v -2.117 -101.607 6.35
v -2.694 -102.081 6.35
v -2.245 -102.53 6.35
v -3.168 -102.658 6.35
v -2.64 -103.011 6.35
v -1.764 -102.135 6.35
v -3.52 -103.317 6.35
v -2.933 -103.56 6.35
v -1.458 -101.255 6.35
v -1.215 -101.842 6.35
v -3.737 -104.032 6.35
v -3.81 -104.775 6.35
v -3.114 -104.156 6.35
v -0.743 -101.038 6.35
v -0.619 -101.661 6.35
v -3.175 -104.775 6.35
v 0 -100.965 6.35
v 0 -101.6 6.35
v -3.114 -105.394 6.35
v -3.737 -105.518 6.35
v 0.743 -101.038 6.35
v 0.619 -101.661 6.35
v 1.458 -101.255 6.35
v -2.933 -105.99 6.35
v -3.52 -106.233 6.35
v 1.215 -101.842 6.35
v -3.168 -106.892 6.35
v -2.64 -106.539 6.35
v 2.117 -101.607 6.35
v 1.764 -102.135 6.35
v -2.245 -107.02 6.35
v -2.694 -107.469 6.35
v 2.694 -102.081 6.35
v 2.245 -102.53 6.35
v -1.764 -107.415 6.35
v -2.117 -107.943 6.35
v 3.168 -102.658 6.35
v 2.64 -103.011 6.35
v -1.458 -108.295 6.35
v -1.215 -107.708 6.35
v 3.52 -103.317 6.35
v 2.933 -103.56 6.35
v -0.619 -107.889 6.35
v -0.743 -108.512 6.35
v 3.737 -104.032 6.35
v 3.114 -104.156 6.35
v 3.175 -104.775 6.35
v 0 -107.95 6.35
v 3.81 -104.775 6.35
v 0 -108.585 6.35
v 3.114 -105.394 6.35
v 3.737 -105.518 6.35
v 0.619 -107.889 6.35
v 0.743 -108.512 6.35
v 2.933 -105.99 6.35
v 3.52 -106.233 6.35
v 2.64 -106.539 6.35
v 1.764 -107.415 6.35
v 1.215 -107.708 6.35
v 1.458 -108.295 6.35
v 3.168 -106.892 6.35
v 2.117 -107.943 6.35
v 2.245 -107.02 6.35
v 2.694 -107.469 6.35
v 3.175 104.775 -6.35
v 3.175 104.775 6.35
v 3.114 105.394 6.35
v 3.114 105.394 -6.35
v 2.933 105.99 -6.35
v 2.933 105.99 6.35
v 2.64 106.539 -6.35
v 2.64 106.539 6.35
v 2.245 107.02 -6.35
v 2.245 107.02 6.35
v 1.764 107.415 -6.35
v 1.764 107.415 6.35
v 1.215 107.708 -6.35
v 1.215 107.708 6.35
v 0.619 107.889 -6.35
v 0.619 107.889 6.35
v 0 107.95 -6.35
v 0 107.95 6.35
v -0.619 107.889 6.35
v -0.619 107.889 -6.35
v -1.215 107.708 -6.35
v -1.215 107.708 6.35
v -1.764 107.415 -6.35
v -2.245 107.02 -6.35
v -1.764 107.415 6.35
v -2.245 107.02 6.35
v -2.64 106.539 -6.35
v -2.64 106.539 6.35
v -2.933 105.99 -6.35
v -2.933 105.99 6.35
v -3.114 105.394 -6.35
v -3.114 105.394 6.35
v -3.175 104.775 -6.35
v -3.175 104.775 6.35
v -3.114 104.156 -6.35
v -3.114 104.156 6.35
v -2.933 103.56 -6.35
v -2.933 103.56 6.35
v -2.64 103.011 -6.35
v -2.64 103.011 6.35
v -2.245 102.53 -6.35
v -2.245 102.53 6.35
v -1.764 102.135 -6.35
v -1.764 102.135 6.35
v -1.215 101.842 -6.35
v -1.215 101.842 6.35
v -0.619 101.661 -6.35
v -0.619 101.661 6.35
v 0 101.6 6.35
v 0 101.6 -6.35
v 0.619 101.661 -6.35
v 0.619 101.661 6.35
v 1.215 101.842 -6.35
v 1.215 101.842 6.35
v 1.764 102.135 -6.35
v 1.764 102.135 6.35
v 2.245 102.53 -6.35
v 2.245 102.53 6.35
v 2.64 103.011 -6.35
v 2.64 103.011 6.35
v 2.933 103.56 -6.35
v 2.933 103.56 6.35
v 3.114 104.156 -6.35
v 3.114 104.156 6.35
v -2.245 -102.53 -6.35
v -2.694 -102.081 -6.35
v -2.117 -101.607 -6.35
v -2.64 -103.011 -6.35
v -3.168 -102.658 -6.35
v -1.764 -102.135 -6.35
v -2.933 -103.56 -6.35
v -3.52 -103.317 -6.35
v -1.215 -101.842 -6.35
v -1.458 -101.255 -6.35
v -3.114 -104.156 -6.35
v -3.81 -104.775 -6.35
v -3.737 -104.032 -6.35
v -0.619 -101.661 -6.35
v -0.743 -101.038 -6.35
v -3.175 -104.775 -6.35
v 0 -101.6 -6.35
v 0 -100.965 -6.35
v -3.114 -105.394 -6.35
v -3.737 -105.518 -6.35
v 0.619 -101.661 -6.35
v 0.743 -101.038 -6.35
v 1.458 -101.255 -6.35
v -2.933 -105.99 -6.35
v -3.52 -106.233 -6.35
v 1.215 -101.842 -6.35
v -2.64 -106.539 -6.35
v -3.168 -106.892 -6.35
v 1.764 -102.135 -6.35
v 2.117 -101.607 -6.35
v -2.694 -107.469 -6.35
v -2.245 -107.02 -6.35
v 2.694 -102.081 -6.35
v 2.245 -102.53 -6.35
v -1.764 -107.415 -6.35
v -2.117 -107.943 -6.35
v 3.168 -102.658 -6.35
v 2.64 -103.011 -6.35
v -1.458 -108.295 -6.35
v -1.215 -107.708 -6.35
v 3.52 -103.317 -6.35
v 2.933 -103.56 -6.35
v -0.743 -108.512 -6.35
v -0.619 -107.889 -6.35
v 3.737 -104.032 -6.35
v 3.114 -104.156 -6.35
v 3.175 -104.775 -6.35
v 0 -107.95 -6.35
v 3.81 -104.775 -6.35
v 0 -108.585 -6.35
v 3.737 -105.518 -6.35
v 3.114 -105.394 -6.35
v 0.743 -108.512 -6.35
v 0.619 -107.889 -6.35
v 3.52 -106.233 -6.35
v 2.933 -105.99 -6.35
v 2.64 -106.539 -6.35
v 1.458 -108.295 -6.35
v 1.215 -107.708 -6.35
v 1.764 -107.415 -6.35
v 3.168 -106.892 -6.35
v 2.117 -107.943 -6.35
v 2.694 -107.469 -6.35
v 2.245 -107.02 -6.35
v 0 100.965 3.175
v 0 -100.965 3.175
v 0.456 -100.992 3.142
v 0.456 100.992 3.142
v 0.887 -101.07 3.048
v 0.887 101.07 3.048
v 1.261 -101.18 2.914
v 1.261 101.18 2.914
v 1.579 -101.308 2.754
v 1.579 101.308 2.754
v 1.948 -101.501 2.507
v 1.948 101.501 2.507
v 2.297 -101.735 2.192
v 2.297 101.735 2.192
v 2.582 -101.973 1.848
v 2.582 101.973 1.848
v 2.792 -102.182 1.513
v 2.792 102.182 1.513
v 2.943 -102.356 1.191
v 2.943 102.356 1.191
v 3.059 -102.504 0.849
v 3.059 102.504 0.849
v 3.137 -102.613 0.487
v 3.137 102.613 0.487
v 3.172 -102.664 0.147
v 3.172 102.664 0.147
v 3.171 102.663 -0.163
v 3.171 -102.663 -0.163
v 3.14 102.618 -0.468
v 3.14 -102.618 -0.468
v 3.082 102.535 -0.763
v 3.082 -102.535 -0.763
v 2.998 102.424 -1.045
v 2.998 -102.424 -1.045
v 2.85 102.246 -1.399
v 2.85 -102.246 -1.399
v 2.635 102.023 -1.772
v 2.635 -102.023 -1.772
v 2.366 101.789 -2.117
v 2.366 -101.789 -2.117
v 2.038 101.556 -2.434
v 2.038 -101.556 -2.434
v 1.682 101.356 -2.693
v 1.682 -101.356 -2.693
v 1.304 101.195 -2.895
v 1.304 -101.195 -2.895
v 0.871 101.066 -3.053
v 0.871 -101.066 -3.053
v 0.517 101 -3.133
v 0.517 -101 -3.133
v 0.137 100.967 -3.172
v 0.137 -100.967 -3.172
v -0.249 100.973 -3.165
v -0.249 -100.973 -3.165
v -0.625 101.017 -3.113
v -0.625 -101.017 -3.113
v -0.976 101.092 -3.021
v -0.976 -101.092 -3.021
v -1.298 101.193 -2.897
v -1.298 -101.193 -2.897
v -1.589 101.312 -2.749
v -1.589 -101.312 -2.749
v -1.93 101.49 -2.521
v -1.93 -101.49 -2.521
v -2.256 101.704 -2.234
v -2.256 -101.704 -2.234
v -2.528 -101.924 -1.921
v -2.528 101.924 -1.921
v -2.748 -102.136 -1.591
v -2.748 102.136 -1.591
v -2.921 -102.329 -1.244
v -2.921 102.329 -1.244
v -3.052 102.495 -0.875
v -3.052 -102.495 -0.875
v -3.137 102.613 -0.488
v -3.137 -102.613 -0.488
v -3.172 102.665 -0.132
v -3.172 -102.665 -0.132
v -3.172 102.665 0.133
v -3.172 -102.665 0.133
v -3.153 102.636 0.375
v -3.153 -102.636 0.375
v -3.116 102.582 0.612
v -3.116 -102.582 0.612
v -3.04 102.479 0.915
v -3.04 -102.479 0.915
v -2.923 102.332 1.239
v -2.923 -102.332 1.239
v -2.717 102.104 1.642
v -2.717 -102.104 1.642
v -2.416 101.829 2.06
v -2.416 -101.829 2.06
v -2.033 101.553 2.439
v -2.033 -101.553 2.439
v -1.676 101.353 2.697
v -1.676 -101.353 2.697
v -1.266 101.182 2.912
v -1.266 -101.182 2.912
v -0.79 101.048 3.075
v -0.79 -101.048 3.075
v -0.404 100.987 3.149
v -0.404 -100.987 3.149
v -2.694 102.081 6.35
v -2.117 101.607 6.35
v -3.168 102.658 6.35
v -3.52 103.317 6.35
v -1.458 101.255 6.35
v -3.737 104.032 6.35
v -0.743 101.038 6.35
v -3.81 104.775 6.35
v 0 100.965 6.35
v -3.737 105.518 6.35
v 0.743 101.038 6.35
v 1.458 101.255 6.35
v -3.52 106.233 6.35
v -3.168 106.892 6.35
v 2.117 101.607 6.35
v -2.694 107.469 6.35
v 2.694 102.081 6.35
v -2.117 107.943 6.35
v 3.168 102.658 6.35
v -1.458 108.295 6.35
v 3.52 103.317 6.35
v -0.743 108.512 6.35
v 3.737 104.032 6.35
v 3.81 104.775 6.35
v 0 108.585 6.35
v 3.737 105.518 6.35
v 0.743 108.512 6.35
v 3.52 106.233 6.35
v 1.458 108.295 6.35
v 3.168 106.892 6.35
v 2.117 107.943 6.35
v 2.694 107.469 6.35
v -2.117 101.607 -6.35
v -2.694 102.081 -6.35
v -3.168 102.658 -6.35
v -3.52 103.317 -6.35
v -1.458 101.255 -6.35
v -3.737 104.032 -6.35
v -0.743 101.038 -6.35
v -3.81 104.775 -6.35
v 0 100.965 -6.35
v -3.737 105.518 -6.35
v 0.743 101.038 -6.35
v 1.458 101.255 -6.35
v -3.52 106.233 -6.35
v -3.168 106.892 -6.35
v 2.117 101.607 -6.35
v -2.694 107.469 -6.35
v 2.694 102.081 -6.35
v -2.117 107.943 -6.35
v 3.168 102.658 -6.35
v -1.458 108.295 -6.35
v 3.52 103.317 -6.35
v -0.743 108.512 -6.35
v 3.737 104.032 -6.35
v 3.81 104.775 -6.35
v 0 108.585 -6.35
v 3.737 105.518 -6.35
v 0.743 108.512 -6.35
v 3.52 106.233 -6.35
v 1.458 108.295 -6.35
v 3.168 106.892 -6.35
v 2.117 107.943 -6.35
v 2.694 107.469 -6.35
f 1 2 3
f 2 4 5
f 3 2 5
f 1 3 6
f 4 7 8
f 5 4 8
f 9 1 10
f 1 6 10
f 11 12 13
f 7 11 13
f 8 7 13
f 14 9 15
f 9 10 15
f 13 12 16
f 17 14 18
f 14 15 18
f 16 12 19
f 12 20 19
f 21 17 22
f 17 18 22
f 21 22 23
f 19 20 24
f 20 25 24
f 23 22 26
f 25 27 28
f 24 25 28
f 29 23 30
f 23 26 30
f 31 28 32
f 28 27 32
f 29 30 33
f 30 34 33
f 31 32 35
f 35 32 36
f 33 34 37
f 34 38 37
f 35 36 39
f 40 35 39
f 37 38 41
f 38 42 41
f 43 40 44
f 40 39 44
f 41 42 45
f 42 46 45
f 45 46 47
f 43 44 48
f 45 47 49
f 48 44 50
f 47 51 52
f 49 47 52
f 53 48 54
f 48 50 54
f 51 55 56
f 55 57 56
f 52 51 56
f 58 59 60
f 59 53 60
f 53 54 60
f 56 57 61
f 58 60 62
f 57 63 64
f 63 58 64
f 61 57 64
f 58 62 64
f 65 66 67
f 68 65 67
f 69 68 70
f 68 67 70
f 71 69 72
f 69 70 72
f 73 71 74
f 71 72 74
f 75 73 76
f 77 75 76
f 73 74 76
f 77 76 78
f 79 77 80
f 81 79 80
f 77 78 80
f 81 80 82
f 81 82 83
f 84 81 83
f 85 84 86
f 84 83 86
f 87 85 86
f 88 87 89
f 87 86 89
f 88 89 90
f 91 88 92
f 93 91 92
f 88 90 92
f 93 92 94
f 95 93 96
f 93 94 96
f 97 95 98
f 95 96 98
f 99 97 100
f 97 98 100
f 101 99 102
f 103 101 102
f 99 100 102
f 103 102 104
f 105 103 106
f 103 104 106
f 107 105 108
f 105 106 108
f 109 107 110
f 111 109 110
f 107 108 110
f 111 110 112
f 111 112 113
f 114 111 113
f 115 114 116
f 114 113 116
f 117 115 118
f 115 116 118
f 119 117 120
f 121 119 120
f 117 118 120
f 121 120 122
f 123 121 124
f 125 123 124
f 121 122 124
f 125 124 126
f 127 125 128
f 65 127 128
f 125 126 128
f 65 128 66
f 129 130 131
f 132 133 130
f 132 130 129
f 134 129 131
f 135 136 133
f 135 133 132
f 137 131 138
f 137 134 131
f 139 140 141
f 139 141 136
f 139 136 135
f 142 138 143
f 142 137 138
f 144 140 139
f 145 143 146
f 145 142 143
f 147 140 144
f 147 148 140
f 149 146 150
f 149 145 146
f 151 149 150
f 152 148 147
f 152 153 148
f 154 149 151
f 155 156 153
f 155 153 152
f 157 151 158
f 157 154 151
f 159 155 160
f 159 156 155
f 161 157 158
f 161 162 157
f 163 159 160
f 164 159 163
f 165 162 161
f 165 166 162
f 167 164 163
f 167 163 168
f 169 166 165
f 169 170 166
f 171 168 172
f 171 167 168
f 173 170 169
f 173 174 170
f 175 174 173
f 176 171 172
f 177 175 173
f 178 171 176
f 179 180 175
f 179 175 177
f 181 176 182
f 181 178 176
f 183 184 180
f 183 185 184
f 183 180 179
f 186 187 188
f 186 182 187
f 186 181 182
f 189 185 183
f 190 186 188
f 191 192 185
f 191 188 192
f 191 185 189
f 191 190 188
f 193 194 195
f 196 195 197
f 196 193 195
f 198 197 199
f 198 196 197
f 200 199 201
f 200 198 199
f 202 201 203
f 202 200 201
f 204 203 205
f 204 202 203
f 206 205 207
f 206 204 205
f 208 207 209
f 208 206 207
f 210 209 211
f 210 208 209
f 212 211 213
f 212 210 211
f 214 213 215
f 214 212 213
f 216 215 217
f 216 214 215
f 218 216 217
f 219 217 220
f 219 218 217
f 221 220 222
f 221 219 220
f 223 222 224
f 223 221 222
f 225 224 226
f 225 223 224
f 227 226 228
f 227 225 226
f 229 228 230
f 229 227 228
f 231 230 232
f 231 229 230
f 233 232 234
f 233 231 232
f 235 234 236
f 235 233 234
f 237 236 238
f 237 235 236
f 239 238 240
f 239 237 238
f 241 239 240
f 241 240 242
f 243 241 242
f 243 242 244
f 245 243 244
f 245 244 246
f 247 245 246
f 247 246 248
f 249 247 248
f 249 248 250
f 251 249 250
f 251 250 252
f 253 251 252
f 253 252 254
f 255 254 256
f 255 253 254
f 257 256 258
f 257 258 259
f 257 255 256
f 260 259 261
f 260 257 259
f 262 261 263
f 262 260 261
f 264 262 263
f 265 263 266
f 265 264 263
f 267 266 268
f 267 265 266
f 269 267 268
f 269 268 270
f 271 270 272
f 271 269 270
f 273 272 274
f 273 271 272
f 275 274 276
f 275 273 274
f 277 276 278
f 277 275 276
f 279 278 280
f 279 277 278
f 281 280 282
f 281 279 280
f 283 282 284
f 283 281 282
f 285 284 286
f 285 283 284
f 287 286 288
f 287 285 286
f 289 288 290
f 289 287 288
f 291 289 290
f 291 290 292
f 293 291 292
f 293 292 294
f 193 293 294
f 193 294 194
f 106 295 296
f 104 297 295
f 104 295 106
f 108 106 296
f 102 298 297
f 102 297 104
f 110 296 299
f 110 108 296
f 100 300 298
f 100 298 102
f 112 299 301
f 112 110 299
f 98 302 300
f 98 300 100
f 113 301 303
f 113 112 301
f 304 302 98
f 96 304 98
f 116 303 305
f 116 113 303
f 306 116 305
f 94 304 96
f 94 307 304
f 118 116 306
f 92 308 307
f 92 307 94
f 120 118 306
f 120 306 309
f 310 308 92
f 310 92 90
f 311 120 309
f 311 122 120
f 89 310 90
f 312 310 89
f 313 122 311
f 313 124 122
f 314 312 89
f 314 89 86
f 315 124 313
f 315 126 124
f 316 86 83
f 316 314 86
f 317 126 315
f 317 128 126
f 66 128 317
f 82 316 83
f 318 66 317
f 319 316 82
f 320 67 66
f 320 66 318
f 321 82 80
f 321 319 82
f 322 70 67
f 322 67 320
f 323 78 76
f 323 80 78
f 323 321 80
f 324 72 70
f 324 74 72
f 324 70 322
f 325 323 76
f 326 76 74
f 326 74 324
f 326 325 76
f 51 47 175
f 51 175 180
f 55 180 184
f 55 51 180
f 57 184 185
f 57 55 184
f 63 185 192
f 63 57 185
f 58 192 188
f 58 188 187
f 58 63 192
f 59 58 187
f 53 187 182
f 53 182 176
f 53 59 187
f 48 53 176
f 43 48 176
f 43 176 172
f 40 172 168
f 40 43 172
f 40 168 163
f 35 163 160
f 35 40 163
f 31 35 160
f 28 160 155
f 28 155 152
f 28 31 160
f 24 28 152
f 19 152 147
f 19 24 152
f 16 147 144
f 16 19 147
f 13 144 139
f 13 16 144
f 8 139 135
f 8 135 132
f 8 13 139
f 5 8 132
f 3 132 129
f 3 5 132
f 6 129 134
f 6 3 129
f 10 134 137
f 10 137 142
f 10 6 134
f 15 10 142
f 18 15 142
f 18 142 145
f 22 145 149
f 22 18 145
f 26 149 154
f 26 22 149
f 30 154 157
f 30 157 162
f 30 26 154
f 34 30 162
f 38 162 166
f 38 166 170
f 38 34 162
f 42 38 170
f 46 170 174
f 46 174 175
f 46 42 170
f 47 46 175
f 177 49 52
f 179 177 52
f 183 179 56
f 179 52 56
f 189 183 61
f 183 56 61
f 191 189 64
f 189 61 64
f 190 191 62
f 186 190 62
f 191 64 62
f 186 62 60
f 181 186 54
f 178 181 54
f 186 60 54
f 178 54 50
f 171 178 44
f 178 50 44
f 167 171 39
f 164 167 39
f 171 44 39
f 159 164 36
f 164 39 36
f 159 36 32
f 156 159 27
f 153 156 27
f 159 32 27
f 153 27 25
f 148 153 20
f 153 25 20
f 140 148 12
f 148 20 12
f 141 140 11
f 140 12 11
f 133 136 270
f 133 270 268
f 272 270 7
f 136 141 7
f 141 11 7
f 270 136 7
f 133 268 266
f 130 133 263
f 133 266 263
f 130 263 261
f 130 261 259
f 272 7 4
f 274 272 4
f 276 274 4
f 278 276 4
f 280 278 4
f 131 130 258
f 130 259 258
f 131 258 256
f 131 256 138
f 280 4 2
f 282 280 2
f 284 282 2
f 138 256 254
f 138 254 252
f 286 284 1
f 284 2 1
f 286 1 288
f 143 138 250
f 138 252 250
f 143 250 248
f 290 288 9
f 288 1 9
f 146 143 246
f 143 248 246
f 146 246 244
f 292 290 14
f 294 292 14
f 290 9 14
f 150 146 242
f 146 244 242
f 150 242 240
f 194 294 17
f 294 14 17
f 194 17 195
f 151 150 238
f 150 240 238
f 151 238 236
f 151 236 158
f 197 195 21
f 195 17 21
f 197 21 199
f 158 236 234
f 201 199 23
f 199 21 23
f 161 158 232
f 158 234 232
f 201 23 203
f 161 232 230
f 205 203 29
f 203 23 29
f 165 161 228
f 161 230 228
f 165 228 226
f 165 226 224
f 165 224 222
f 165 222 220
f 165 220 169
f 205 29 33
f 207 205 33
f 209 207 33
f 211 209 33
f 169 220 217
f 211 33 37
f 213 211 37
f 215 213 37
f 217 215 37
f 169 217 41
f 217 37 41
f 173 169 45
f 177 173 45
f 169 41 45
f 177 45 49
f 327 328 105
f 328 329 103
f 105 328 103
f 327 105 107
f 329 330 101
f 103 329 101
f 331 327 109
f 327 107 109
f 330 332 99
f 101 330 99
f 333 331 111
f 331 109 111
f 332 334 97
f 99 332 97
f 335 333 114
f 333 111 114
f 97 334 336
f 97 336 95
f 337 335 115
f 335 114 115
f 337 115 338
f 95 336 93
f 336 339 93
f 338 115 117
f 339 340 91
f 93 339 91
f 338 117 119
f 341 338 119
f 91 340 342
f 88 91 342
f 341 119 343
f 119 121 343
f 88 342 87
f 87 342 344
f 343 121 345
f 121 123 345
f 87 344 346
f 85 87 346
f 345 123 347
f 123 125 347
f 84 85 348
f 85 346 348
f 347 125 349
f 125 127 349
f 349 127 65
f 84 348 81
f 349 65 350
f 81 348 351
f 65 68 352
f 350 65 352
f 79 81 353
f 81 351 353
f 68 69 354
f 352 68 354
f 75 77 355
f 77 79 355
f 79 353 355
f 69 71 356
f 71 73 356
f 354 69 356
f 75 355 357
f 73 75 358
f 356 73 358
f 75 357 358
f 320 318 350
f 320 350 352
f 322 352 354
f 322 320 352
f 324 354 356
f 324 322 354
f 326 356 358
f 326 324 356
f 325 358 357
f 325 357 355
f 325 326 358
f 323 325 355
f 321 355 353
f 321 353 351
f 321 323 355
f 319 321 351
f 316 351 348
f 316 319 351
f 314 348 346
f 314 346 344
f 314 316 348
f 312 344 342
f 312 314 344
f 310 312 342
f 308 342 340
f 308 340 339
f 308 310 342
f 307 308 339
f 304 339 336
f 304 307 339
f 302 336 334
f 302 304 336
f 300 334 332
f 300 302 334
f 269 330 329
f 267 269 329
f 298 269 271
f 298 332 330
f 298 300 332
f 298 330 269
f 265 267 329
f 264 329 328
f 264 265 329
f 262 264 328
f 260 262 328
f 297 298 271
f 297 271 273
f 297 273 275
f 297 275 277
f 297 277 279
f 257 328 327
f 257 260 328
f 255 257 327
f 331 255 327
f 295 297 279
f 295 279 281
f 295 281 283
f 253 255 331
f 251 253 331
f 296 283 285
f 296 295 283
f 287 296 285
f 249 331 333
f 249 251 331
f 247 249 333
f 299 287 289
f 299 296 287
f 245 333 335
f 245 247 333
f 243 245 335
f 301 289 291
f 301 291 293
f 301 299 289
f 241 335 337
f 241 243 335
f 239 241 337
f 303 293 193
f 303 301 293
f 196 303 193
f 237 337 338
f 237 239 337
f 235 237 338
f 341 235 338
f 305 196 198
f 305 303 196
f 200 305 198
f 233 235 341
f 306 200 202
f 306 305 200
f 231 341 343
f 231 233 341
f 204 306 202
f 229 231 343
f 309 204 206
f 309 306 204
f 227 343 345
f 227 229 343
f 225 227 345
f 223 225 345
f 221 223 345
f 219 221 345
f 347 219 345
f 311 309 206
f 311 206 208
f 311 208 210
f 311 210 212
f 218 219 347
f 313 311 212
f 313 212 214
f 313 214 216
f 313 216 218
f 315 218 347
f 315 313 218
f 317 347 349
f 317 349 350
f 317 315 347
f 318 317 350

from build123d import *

# Parameters (mm, degrees)
SKETCH3_R           = 3.175
BOSS_EXTRUDE1_DEPTH = 104.775
SKETCH4_R           = 3.81
BOSS_EXTRUDE2_DEPTH = 6.35
SKETCH5_R           = 3.175
CUT_EXTRUDE1_DEPTH  = 12.7


with BuildPart() as part:
    # Sketch3 → Boss-Extrude1 (new, symmetric)
    with BuildSketch(Plane(origin=(0, 0, 0), x_dir=(1, 0, 0), z_dir=(0, 1, 0))):
        with Locations(Location((0, 0, 0), (0, 0, 270))):
            Circle(SKETCH3_R)
    extrude(amount=BOSS_EXTRUDE1_DEPTH, both=True)

    # Sketch4 → Boss-Extrude2 (add, symmetric)
    with BuildSketch(Plane.XY):
        with Locations((0, 104.775)):
            Circle(SKETCH4_R)
    boss_extrude2 = extrude(amount=BOSS_EXTRUDE2_DEPTH, both=True)

    # Sketch5 → Cut-Extrude1 (cut)
    with BuildSketch(Plane.XY.offset(6.35)):
        with Locations((0, 104.775)):
            Circle(SKETCH5_R)
    cut_extrude1 = extrude(amount=-CUT_EXTRUDE1_DEPTH, mode=Mode.SUBTRACT)

    # Mirror1: Boss-Extrude2, Cut-Extrude1 across plane
    add(boss_extrude2.mirror(Plane.ZX))
    add(cut_extrude1.mirror(Plane.ZX), mode=Mode.SUBTRACT)


solid = part.part
